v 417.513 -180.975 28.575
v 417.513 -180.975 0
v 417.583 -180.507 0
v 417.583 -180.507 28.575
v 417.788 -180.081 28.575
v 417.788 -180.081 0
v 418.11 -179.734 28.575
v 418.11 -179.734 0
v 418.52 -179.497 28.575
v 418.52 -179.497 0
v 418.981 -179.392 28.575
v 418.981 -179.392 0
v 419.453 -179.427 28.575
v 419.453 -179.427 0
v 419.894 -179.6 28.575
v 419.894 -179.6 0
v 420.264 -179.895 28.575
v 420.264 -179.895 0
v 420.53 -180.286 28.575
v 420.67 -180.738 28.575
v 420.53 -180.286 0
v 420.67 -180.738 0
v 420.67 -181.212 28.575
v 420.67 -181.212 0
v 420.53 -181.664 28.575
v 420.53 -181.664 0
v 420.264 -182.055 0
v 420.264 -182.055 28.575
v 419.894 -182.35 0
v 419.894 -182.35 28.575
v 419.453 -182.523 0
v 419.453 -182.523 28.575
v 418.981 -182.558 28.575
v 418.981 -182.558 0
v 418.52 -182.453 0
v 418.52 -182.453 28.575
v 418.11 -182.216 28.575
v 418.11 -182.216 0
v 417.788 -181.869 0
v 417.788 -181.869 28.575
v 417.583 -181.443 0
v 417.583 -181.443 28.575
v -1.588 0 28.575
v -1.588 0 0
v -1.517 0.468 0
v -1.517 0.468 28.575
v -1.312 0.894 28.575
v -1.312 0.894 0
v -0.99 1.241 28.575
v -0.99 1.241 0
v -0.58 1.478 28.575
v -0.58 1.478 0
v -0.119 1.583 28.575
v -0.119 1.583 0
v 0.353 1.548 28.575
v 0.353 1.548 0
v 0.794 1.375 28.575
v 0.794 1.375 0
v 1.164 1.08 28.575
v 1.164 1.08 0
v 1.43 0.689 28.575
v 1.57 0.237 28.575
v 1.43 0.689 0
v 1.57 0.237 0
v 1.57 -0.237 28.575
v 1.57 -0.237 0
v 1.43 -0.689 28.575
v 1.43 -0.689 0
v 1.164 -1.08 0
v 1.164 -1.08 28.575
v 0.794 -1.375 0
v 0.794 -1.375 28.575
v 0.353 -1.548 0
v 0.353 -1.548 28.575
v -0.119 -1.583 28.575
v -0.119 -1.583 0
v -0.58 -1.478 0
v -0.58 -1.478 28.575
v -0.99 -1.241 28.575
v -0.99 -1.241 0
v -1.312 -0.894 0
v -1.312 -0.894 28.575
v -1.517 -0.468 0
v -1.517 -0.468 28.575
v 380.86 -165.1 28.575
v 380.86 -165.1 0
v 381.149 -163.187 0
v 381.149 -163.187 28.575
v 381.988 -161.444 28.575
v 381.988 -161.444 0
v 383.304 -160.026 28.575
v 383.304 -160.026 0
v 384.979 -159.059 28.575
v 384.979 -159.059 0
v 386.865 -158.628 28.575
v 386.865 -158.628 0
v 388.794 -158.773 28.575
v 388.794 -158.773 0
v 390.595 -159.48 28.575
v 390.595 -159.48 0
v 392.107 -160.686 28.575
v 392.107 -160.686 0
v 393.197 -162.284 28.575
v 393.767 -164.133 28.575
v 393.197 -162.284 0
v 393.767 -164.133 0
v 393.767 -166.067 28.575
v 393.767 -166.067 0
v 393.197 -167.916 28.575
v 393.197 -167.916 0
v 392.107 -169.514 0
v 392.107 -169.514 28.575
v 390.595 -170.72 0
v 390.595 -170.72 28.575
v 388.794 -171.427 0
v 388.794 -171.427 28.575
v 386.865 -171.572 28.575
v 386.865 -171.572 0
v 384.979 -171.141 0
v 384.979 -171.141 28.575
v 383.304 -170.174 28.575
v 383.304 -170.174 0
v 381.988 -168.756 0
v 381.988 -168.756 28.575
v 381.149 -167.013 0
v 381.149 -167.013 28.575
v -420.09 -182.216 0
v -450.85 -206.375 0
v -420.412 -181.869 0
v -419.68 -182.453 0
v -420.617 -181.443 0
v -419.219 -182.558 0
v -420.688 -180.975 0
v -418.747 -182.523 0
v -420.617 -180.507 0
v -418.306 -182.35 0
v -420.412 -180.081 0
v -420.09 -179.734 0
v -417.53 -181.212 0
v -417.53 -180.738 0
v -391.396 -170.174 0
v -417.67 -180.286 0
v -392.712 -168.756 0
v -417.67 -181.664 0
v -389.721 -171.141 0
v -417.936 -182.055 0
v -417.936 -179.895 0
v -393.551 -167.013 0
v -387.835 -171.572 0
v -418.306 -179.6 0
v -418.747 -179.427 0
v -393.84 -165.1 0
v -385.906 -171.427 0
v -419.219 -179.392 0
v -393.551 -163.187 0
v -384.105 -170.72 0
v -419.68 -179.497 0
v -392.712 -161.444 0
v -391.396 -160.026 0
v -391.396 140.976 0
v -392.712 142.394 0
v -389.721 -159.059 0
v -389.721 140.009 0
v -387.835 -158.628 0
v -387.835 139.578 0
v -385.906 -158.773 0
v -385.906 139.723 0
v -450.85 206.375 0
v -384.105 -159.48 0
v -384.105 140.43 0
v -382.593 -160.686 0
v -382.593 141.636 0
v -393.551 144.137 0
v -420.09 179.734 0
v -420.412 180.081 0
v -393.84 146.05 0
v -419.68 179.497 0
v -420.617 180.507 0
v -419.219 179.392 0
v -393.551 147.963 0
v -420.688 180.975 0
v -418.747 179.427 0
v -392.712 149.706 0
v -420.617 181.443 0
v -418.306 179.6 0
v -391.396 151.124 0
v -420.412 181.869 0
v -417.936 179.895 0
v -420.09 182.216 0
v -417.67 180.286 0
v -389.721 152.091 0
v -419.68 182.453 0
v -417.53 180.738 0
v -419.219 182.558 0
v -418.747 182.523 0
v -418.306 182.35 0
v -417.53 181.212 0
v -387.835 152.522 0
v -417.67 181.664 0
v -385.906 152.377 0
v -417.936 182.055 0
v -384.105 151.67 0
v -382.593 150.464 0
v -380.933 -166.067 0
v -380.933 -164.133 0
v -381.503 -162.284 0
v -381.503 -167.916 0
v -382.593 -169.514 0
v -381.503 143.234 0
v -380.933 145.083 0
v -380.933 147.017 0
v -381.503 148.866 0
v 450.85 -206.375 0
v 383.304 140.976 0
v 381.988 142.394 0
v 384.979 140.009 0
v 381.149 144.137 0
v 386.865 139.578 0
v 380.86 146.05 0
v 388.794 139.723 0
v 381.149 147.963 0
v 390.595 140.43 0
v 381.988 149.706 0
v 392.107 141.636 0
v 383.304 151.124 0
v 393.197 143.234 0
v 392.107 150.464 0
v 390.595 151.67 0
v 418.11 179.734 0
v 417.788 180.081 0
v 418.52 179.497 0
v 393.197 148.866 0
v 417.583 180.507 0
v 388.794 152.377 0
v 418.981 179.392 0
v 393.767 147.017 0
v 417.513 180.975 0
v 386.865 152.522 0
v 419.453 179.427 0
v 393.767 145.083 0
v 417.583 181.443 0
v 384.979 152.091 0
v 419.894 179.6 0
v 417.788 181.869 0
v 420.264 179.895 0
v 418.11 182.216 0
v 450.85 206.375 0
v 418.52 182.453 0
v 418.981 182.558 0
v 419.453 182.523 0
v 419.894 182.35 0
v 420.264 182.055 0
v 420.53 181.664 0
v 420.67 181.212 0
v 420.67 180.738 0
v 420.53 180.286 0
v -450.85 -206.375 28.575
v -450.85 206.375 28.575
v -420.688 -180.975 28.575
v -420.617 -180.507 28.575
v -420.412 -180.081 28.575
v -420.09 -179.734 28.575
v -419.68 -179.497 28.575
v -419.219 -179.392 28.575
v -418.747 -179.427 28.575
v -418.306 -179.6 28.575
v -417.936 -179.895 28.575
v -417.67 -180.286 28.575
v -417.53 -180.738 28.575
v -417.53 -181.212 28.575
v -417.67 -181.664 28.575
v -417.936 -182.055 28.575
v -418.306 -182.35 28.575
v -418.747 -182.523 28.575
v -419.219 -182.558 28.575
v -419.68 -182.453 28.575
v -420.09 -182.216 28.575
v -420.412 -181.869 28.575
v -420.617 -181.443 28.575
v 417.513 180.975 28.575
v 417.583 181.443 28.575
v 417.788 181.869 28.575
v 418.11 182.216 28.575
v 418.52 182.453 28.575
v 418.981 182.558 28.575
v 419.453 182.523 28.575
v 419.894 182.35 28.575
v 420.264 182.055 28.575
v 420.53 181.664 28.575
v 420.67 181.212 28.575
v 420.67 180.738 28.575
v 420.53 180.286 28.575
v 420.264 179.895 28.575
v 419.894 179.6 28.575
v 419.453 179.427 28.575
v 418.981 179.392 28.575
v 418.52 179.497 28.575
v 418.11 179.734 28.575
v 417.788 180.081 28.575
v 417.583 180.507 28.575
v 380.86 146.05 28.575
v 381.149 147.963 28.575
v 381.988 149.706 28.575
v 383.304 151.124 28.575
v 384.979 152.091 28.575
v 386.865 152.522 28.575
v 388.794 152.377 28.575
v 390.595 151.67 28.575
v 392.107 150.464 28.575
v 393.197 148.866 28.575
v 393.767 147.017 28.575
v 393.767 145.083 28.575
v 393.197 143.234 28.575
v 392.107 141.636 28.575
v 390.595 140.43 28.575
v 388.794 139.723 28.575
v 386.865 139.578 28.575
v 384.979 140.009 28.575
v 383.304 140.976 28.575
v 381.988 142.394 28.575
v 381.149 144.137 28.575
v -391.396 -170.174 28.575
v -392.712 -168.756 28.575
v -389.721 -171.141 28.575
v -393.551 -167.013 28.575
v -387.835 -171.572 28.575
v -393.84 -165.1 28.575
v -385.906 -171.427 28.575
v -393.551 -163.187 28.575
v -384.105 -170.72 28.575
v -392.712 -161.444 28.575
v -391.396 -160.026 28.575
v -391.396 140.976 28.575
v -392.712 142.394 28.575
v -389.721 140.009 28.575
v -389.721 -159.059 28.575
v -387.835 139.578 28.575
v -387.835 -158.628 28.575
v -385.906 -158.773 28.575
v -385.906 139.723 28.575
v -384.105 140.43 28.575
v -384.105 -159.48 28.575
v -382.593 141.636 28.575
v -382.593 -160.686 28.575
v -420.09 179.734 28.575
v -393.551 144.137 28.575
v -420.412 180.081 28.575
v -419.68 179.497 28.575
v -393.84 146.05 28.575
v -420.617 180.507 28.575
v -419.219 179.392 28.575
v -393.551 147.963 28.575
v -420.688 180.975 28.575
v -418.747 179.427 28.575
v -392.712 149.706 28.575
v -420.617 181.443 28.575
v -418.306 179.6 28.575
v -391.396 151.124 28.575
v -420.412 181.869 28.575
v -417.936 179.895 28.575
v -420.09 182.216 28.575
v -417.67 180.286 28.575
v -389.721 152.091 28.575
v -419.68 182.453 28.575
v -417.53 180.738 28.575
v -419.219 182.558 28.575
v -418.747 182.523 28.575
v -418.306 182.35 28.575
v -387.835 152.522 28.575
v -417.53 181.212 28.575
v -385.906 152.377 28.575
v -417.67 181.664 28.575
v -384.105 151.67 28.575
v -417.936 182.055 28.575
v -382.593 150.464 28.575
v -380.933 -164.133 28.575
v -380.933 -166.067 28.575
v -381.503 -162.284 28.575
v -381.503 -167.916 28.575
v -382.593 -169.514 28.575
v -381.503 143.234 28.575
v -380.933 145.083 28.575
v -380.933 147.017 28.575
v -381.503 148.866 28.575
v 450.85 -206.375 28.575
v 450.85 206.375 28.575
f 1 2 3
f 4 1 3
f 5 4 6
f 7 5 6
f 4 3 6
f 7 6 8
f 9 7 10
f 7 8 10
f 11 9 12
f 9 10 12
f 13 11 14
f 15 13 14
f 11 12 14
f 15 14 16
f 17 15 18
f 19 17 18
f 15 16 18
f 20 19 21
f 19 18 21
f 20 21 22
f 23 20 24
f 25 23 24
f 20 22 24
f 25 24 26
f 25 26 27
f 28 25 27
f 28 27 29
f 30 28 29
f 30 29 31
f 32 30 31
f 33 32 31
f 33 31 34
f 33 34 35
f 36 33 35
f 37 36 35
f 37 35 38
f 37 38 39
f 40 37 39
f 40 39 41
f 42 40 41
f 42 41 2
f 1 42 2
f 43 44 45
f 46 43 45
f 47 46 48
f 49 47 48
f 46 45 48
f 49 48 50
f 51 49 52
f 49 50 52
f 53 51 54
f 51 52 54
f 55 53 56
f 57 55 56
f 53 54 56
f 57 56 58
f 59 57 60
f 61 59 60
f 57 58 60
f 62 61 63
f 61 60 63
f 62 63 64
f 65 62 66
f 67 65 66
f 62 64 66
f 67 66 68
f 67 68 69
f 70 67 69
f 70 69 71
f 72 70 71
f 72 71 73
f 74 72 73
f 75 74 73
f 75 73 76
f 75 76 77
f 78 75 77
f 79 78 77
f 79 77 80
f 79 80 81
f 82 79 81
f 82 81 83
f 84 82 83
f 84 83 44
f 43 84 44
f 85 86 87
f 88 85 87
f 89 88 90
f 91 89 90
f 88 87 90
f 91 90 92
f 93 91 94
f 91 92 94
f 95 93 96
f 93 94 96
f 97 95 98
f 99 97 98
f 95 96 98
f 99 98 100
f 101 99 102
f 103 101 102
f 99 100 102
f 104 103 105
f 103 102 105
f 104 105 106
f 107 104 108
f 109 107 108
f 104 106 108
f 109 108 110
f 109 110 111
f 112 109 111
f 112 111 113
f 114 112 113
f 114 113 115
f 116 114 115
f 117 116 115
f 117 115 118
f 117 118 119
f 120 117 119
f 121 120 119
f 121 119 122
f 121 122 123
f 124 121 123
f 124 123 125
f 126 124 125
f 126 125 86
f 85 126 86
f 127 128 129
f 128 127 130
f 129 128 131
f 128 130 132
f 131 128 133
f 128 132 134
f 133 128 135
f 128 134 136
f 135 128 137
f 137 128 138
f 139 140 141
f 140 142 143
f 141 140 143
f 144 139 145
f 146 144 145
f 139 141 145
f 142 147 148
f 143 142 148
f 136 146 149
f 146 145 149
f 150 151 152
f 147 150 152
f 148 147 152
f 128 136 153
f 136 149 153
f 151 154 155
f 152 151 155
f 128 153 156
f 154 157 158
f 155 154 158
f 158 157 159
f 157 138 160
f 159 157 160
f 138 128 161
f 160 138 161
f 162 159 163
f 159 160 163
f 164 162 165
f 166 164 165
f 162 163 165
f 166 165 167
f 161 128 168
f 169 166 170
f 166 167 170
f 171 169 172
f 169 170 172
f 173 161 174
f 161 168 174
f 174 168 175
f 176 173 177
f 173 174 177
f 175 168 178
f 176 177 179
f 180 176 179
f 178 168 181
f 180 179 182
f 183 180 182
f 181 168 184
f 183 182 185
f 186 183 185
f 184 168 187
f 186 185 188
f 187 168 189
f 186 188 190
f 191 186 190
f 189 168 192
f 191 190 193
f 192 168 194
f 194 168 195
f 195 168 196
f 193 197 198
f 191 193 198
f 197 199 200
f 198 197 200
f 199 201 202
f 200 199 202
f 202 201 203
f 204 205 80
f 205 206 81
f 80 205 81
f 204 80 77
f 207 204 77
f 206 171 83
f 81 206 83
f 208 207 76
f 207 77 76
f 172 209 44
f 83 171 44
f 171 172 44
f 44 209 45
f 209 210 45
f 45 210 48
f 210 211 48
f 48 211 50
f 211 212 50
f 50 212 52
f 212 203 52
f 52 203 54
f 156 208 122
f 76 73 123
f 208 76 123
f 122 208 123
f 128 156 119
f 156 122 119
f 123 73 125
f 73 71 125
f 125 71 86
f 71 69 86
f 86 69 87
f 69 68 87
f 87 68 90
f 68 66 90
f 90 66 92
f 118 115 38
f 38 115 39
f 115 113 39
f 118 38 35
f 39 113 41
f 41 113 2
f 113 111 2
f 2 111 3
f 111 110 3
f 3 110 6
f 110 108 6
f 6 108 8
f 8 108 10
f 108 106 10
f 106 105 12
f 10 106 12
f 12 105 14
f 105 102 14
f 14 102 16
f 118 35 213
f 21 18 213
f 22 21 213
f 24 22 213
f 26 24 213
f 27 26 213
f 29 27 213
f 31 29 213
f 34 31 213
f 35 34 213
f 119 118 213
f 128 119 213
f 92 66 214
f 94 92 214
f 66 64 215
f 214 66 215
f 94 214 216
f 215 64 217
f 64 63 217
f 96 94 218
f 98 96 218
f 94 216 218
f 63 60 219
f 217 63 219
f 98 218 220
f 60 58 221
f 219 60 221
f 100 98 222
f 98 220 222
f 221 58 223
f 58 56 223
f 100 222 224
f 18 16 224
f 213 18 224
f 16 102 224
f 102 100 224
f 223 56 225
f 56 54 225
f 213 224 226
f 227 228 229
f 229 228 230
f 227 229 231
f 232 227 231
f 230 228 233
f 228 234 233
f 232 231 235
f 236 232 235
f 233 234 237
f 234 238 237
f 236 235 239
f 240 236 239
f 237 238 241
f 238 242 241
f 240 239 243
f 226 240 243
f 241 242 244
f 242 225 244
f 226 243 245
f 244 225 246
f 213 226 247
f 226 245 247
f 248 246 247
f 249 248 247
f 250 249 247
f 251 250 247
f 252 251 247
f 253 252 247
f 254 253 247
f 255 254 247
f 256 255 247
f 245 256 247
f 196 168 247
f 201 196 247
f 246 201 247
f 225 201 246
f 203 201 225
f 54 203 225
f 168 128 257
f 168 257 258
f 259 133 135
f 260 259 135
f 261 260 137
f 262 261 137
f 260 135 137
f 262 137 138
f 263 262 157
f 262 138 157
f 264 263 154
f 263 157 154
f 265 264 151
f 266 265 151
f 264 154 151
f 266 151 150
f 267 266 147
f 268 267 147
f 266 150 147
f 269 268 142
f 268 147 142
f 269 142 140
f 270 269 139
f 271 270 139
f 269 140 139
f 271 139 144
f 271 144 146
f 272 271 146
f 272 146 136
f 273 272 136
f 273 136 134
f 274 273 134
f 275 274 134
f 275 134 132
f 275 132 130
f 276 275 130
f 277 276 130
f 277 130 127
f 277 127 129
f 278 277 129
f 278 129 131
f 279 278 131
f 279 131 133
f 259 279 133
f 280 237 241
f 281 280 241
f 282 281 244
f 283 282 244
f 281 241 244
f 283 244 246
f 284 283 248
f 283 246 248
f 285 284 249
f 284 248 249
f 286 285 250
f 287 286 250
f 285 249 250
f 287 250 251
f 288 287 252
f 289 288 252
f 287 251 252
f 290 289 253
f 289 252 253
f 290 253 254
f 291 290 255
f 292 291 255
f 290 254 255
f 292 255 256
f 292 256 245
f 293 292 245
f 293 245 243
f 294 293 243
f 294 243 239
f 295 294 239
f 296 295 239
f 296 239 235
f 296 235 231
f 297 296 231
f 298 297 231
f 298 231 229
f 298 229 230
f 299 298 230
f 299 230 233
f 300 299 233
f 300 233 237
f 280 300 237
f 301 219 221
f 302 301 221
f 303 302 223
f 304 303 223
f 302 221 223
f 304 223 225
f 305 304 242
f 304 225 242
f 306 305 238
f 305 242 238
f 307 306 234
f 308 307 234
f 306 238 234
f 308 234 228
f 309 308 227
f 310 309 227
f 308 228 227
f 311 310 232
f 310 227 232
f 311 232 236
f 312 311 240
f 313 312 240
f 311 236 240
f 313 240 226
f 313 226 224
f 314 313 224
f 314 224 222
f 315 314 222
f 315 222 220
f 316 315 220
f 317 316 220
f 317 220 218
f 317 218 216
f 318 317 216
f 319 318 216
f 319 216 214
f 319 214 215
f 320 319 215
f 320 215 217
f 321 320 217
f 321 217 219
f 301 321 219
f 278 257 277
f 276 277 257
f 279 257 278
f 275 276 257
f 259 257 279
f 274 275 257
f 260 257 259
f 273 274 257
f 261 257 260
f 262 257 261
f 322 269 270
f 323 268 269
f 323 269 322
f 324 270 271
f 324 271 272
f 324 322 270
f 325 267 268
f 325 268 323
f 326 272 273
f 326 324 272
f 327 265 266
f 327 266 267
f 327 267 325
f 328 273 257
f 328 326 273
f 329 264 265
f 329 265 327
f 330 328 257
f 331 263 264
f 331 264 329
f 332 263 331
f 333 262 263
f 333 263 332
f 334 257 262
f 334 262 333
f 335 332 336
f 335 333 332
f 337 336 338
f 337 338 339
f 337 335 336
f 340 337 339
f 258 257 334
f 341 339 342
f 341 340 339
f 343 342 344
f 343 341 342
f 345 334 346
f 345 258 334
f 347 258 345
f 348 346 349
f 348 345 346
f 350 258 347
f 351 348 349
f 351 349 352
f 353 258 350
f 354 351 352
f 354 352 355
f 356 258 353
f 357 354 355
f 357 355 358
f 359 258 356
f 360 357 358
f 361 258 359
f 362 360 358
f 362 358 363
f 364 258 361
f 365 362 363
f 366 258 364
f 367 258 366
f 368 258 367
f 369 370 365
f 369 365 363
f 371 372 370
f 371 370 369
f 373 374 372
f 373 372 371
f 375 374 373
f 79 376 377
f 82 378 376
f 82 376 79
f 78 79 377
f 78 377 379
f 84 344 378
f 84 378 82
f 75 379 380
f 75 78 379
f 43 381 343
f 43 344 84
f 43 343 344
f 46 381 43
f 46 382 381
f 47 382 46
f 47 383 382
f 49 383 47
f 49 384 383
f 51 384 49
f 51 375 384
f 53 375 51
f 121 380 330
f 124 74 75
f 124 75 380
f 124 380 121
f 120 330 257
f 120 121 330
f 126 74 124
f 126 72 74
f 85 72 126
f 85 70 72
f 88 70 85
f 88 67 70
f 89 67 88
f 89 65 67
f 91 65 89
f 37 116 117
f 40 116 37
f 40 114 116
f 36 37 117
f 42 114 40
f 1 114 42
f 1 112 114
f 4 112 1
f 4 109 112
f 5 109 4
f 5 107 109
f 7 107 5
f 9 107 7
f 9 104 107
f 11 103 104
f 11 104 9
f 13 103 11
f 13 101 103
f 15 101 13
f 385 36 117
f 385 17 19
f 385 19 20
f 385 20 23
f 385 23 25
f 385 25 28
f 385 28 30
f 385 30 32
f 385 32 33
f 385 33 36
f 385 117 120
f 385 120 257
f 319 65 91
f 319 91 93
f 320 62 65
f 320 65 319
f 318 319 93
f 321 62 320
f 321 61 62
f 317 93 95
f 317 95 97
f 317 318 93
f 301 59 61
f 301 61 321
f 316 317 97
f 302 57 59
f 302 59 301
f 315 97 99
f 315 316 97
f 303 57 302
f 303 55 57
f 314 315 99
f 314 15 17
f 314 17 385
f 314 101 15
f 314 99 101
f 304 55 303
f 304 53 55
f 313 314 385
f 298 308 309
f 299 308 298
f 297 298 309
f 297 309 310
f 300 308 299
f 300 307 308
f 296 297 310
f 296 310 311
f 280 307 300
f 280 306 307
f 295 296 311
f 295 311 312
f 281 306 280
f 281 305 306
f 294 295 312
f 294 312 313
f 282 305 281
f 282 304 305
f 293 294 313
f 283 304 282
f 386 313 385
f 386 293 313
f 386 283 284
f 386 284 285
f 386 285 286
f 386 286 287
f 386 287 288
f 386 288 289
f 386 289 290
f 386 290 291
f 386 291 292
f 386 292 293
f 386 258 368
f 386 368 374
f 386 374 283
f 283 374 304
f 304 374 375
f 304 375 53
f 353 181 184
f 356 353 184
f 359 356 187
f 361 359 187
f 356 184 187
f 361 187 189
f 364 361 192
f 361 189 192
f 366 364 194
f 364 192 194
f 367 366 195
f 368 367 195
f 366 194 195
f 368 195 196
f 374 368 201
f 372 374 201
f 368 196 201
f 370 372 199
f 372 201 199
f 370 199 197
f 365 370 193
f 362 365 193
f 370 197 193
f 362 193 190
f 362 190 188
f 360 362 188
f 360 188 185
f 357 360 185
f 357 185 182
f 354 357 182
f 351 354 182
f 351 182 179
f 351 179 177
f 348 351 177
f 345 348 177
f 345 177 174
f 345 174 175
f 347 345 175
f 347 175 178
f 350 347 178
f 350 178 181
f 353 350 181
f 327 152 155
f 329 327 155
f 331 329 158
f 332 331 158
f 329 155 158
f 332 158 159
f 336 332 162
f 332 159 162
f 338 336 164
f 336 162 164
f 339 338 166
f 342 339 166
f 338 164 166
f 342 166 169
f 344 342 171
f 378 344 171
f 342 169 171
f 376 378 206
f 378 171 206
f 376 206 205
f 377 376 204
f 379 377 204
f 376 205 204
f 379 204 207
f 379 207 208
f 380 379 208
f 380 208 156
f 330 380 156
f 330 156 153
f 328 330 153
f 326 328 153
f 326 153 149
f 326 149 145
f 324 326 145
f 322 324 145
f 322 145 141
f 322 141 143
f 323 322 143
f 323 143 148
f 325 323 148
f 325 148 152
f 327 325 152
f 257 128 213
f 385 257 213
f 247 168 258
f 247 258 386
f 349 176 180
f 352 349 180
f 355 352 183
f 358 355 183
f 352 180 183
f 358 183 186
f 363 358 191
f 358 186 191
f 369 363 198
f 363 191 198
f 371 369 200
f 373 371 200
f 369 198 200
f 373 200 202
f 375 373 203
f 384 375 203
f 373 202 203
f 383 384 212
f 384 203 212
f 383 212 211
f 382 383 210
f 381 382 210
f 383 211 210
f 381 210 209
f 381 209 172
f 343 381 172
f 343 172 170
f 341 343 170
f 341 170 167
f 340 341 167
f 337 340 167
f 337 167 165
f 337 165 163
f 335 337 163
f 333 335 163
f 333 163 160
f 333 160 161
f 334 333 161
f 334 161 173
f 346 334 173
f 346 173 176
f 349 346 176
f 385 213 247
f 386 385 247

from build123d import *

# Parameters (mm, degrees)
F0_W     = 901.7
F0_H     = 412.75
F1_DEPTH = 28.575
F3_D     = 12.9794
F3_DEPTH = 31.75
F5_D     = 3.175
F5_DEPTH = 31.75


with BuildPart() as f1:
    # F0 (on Top) → F1 (new body)
    with BuildSketch(Plane.XY):
        Rectangle(F0_W, F0_H)
    extrude(amount=F1_DEPTH)

    # F3
    with Locations(Plane.XY.offset(28.575)):
        with Locations((-387.35, 146.05), (-387.35, -165.1), (387.35, -165.1), (387.35, 146.05)):
            Hole(F3_D / 2, depth=F3_DEPTH)

    # F5
    with Locations(Plane.XY.offset(28.575)):
        with Locations((-419.1, 180.975), (-419.1, -180.975), (419.1, -180.975), (419.1, 180.975), (0, 0)):
            Hole(F5_D / 2, depth=F5_DEPTH)


solid = f1.part
